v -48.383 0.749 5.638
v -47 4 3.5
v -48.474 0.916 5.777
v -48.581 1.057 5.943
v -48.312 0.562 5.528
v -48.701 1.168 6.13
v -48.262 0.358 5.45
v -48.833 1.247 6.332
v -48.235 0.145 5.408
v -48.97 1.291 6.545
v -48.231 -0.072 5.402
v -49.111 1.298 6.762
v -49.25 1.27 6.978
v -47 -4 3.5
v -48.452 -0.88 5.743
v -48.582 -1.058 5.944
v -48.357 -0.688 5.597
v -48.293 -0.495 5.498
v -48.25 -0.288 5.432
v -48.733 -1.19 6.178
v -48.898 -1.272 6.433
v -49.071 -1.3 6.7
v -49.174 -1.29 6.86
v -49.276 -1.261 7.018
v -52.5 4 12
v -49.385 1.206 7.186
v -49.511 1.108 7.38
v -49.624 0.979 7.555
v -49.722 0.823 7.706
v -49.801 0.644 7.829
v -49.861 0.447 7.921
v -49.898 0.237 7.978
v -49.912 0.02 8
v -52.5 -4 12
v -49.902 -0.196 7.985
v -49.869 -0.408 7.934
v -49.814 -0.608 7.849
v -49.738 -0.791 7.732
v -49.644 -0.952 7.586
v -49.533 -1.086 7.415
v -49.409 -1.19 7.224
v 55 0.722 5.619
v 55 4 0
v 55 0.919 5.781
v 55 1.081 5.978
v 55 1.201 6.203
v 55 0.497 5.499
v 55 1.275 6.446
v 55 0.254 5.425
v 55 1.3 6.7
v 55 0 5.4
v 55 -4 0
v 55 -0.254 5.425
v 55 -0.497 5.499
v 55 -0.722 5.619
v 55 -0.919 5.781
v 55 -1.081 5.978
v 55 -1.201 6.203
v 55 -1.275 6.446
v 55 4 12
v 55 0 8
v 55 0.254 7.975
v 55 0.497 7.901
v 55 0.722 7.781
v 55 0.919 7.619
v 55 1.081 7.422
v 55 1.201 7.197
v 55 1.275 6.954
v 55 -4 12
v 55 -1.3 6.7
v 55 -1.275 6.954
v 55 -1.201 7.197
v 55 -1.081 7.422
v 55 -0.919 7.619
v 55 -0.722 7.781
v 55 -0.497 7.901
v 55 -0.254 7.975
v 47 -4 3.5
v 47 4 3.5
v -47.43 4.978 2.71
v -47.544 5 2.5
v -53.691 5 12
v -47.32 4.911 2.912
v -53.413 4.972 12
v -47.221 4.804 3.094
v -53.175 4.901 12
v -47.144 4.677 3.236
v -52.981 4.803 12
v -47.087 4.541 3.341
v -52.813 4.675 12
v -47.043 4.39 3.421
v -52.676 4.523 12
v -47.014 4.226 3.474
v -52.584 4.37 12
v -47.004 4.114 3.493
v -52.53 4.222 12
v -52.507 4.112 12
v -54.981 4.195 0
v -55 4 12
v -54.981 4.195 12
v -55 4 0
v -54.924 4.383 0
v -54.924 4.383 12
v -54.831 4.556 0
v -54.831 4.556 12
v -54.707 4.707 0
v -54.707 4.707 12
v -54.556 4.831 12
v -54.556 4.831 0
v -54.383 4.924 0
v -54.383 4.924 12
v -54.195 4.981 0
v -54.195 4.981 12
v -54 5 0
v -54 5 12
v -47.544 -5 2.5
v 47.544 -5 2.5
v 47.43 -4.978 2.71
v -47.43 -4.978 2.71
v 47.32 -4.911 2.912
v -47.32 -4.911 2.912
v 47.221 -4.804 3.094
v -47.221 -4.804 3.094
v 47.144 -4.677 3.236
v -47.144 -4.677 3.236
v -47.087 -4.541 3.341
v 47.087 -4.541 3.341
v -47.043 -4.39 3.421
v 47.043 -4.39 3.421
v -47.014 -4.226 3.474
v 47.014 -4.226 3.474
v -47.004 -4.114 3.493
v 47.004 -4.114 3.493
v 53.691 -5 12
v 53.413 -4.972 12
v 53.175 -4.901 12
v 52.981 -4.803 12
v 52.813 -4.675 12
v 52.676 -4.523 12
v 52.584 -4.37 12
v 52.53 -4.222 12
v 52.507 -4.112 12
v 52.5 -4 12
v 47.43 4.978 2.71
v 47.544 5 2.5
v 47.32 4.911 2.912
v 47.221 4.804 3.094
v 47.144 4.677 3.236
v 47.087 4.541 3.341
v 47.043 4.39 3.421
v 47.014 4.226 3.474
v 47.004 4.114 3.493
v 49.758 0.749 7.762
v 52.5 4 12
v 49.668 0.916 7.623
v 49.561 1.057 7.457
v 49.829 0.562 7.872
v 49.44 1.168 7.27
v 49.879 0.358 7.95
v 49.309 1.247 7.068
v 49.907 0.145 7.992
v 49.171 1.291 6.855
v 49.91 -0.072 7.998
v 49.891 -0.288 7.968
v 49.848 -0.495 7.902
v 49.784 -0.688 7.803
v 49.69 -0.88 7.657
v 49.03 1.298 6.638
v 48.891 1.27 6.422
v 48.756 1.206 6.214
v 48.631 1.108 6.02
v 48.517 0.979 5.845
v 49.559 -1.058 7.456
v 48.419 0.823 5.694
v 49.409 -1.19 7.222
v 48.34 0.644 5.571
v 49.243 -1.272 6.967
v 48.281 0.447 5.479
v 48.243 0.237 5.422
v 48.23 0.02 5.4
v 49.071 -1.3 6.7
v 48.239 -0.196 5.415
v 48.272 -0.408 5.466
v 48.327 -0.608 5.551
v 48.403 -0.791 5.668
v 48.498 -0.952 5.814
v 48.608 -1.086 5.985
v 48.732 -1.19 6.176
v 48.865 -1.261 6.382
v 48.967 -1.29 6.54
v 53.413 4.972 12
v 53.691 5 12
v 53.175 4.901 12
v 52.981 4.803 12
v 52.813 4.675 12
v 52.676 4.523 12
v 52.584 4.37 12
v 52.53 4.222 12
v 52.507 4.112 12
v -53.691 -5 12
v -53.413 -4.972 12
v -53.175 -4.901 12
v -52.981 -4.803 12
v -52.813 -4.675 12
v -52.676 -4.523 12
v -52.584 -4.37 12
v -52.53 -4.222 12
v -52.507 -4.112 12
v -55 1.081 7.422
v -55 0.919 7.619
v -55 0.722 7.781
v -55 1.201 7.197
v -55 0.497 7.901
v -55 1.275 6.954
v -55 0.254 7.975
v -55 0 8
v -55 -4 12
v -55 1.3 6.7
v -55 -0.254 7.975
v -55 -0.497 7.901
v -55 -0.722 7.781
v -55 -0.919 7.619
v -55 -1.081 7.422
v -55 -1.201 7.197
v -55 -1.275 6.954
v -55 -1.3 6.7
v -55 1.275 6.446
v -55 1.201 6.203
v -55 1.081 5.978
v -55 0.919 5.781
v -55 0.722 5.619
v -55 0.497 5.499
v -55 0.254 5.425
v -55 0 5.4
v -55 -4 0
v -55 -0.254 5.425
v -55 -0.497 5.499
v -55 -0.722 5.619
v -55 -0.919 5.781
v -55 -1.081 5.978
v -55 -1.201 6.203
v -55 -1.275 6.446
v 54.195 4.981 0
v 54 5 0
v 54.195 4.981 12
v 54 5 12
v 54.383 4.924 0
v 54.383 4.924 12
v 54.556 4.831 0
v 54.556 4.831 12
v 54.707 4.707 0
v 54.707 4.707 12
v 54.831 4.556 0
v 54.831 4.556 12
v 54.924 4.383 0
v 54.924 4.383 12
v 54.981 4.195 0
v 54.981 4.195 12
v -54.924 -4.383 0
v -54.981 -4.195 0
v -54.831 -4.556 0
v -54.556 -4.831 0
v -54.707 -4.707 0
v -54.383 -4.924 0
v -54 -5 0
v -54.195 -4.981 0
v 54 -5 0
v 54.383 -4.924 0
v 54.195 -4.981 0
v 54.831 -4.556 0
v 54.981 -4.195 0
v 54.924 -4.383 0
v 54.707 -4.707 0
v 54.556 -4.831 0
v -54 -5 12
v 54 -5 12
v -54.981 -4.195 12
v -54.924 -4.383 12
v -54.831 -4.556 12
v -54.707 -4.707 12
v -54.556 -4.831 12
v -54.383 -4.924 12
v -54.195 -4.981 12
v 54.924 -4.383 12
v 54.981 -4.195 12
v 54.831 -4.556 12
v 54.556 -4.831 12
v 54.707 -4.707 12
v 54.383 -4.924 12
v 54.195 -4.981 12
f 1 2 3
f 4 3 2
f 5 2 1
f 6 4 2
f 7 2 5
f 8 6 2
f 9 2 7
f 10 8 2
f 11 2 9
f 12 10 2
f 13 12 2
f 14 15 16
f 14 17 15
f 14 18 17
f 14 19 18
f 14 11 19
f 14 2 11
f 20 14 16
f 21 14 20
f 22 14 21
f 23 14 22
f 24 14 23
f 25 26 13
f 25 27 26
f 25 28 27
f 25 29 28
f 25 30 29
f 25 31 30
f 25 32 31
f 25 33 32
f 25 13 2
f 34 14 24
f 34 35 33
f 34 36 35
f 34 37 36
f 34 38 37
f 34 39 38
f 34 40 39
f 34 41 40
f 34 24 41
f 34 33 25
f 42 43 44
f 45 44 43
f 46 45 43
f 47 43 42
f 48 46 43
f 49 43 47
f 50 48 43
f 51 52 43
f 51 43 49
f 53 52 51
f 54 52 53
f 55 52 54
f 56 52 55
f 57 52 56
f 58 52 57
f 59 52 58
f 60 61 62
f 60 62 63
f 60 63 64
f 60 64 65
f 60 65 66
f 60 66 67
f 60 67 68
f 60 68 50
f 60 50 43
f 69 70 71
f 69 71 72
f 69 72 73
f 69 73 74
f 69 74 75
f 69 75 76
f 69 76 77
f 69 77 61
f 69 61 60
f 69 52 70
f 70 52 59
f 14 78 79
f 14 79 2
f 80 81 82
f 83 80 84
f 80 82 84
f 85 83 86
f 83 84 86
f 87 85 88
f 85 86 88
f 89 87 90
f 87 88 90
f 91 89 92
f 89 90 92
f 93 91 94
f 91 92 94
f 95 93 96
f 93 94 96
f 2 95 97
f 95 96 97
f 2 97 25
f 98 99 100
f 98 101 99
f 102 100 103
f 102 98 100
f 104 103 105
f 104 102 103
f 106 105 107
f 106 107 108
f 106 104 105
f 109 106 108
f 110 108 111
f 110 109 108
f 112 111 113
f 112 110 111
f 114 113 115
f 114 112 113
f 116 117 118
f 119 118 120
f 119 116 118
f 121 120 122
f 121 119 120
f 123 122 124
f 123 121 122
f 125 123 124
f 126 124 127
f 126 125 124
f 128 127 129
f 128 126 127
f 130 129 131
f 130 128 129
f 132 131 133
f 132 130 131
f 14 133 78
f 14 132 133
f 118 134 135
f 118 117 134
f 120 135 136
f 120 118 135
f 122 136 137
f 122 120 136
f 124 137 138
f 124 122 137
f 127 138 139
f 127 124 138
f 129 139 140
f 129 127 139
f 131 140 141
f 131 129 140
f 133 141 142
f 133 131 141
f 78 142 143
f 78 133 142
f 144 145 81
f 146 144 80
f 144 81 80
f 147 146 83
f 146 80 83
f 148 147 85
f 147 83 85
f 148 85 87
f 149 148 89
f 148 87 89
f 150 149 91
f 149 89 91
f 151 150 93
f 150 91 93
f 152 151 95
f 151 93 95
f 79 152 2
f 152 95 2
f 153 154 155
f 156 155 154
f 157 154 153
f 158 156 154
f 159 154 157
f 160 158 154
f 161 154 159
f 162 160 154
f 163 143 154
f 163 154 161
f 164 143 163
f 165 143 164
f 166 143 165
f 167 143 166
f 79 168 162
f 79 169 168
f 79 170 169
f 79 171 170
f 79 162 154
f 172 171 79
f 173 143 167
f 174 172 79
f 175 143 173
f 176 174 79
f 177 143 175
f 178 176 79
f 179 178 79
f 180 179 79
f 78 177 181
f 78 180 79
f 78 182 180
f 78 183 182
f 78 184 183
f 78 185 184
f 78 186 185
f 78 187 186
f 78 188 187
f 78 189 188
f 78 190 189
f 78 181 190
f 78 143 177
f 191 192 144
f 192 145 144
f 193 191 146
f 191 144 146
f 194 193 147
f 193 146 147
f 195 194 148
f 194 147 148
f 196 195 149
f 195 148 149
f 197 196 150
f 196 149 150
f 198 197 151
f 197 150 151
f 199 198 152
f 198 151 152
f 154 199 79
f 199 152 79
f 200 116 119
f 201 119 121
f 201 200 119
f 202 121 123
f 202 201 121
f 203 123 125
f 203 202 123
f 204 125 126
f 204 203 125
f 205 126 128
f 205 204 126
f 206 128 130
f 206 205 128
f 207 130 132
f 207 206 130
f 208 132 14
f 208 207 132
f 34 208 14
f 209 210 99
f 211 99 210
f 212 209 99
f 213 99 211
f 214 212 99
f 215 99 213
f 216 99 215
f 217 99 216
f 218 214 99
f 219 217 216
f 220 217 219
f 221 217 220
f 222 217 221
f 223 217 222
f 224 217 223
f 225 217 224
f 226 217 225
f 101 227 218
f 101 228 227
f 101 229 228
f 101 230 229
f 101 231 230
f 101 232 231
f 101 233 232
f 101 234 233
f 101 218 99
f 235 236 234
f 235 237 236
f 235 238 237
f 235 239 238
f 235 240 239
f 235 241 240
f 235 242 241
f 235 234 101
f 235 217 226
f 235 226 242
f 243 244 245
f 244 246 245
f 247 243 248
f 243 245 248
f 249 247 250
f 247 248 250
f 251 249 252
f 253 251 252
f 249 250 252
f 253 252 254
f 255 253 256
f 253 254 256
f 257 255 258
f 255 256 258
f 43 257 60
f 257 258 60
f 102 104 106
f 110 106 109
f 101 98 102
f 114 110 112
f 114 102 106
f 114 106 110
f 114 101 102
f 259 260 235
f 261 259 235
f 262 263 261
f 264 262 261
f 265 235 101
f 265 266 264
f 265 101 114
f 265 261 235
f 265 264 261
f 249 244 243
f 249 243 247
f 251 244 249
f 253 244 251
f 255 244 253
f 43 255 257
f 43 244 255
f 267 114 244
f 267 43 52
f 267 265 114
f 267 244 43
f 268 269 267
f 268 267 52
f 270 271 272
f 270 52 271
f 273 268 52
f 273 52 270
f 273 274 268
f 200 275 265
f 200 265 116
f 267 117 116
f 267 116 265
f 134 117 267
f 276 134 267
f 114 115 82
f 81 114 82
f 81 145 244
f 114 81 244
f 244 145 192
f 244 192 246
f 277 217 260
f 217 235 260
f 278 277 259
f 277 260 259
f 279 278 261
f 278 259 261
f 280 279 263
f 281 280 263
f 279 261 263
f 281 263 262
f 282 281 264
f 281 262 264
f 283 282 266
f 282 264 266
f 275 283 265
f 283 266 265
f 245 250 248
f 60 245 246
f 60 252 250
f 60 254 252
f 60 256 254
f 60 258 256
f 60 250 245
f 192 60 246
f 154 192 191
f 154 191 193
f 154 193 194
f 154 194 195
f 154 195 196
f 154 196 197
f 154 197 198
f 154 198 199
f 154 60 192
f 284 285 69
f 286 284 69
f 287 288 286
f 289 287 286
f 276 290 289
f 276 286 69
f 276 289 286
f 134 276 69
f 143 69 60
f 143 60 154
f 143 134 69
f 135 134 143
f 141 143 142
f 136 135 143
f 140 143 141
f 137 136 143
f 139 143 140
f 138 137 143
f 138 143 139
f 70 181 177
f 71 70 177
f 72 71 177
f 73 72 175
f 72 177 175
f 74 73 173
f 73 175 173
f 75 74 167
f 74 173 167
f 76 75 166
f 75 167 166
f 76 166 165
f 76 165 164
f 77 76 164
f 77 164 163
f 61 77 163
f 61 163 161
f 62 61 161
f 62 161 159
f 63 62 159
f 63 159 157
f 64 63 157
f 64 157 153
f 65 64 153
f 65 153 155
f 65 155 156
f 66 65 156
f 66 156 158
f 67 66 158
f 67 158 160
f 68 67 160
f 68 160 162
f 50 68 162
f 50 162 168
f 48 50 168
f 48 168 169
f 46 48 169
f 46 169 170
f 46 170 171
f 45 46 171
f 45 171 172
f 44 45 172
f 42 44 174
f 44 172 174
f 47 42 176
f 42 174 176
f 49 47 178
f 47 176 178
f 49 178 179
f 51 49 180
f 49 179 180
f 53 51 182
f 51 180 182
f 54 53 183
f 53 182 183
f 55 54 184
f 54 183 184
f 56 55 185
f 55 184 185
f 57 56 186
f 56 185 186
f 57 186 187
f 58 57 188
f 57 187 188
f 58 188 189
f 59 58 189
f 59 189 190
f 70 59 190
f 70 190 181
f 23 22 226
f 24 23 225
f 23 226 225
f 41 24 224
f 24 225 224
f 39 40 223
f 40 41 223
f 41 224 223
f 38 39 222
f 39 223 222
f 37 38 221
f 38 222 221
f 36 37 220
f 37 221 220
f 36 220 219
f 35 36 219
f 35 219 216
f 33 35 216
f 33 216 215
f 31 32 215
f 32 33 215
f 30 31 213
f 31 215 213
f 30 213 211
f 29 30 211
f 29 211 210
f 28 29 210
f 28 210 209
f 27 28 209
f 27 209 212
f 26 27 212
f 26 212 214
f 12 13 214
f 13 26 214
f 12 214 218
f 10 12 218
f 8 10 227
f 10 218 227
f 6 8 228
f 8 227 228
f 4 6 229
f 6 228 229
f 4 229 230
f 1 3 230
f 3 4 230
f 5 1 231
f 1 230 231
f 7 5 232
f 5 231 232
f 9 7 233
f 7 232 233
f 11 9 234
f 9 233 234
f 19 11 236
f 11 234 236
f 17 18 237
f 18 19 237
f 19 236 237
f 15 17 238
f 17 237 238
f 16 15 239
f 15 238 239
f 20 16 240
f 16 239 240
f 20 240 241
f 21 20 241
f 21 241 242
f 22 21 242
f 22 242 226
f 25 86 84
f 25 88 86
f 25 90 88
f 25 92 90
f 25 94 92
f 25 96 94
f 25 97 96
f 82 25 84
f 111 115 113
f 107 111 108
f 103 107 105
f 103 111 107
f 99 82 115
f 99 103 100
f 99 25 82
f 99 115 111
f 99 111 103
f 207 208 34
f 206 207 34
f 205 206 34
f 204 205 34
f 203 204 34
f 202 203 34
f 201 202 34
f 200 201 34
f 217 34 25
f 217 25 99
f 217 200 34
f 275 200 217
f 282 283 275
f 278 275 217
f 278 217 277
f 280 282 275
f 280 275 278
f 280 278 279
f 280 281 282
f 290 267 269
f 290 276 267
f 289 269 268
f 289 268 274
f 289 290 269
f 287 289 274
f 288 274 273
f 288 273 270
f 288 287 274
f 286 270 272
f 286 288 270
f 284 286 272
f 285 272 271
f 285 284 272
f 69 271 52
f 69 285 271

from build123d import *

# Parameters (mm, degrees)
F1_DEPTH = 5
F2_R     = 1.3
F3_DEPTH = 110
F4_R     = 1


with BuildPart() as f1:
    # F0 (on Front) → F1 (new body, symmetric)
    with BuildSketch(Plane.XZ):
        Polygon((-55, 12), (-55, 0), (0, 0), (55, 0), (55, 12), (52.5, 12), (47, 3.5), (0, 3.5), (-47, 3.5), (-52.5, 12), align=None)
    extrude(amount=F1_DEPTH, both=True)

    # F2 (on face) → F3 (cut, through all)
    with BuildSketch(Plane(origin=(-55, 0, 0), x_dir=(0, -1, 0), z_dir=(-1, 0, 0))):
        with Locations((0, 6.7)):
            Circle(F2_R)
    extrude(amount=-F3_DEPTH, mode=Mode.SUBTRACT)

    # F4
    f4_edges = [f1.edges().sort_by_distance(p)[0] for p in [
        (-49.75, 5, 7.75),
        (-49.75, -5, 7.75),
        (0, -5, 3.5),
        (0, 5, 3.5),
        (49.75, 5, 7.75),
        (49.75, -5, 7.75),
        (-55, -5, 6),
        (-55, 5, 6),
        (55, -5, 6),
        (55, 5, 6),
    ]]
    fillet(f4_edges, radius=F4_R)


solid = f1.part
